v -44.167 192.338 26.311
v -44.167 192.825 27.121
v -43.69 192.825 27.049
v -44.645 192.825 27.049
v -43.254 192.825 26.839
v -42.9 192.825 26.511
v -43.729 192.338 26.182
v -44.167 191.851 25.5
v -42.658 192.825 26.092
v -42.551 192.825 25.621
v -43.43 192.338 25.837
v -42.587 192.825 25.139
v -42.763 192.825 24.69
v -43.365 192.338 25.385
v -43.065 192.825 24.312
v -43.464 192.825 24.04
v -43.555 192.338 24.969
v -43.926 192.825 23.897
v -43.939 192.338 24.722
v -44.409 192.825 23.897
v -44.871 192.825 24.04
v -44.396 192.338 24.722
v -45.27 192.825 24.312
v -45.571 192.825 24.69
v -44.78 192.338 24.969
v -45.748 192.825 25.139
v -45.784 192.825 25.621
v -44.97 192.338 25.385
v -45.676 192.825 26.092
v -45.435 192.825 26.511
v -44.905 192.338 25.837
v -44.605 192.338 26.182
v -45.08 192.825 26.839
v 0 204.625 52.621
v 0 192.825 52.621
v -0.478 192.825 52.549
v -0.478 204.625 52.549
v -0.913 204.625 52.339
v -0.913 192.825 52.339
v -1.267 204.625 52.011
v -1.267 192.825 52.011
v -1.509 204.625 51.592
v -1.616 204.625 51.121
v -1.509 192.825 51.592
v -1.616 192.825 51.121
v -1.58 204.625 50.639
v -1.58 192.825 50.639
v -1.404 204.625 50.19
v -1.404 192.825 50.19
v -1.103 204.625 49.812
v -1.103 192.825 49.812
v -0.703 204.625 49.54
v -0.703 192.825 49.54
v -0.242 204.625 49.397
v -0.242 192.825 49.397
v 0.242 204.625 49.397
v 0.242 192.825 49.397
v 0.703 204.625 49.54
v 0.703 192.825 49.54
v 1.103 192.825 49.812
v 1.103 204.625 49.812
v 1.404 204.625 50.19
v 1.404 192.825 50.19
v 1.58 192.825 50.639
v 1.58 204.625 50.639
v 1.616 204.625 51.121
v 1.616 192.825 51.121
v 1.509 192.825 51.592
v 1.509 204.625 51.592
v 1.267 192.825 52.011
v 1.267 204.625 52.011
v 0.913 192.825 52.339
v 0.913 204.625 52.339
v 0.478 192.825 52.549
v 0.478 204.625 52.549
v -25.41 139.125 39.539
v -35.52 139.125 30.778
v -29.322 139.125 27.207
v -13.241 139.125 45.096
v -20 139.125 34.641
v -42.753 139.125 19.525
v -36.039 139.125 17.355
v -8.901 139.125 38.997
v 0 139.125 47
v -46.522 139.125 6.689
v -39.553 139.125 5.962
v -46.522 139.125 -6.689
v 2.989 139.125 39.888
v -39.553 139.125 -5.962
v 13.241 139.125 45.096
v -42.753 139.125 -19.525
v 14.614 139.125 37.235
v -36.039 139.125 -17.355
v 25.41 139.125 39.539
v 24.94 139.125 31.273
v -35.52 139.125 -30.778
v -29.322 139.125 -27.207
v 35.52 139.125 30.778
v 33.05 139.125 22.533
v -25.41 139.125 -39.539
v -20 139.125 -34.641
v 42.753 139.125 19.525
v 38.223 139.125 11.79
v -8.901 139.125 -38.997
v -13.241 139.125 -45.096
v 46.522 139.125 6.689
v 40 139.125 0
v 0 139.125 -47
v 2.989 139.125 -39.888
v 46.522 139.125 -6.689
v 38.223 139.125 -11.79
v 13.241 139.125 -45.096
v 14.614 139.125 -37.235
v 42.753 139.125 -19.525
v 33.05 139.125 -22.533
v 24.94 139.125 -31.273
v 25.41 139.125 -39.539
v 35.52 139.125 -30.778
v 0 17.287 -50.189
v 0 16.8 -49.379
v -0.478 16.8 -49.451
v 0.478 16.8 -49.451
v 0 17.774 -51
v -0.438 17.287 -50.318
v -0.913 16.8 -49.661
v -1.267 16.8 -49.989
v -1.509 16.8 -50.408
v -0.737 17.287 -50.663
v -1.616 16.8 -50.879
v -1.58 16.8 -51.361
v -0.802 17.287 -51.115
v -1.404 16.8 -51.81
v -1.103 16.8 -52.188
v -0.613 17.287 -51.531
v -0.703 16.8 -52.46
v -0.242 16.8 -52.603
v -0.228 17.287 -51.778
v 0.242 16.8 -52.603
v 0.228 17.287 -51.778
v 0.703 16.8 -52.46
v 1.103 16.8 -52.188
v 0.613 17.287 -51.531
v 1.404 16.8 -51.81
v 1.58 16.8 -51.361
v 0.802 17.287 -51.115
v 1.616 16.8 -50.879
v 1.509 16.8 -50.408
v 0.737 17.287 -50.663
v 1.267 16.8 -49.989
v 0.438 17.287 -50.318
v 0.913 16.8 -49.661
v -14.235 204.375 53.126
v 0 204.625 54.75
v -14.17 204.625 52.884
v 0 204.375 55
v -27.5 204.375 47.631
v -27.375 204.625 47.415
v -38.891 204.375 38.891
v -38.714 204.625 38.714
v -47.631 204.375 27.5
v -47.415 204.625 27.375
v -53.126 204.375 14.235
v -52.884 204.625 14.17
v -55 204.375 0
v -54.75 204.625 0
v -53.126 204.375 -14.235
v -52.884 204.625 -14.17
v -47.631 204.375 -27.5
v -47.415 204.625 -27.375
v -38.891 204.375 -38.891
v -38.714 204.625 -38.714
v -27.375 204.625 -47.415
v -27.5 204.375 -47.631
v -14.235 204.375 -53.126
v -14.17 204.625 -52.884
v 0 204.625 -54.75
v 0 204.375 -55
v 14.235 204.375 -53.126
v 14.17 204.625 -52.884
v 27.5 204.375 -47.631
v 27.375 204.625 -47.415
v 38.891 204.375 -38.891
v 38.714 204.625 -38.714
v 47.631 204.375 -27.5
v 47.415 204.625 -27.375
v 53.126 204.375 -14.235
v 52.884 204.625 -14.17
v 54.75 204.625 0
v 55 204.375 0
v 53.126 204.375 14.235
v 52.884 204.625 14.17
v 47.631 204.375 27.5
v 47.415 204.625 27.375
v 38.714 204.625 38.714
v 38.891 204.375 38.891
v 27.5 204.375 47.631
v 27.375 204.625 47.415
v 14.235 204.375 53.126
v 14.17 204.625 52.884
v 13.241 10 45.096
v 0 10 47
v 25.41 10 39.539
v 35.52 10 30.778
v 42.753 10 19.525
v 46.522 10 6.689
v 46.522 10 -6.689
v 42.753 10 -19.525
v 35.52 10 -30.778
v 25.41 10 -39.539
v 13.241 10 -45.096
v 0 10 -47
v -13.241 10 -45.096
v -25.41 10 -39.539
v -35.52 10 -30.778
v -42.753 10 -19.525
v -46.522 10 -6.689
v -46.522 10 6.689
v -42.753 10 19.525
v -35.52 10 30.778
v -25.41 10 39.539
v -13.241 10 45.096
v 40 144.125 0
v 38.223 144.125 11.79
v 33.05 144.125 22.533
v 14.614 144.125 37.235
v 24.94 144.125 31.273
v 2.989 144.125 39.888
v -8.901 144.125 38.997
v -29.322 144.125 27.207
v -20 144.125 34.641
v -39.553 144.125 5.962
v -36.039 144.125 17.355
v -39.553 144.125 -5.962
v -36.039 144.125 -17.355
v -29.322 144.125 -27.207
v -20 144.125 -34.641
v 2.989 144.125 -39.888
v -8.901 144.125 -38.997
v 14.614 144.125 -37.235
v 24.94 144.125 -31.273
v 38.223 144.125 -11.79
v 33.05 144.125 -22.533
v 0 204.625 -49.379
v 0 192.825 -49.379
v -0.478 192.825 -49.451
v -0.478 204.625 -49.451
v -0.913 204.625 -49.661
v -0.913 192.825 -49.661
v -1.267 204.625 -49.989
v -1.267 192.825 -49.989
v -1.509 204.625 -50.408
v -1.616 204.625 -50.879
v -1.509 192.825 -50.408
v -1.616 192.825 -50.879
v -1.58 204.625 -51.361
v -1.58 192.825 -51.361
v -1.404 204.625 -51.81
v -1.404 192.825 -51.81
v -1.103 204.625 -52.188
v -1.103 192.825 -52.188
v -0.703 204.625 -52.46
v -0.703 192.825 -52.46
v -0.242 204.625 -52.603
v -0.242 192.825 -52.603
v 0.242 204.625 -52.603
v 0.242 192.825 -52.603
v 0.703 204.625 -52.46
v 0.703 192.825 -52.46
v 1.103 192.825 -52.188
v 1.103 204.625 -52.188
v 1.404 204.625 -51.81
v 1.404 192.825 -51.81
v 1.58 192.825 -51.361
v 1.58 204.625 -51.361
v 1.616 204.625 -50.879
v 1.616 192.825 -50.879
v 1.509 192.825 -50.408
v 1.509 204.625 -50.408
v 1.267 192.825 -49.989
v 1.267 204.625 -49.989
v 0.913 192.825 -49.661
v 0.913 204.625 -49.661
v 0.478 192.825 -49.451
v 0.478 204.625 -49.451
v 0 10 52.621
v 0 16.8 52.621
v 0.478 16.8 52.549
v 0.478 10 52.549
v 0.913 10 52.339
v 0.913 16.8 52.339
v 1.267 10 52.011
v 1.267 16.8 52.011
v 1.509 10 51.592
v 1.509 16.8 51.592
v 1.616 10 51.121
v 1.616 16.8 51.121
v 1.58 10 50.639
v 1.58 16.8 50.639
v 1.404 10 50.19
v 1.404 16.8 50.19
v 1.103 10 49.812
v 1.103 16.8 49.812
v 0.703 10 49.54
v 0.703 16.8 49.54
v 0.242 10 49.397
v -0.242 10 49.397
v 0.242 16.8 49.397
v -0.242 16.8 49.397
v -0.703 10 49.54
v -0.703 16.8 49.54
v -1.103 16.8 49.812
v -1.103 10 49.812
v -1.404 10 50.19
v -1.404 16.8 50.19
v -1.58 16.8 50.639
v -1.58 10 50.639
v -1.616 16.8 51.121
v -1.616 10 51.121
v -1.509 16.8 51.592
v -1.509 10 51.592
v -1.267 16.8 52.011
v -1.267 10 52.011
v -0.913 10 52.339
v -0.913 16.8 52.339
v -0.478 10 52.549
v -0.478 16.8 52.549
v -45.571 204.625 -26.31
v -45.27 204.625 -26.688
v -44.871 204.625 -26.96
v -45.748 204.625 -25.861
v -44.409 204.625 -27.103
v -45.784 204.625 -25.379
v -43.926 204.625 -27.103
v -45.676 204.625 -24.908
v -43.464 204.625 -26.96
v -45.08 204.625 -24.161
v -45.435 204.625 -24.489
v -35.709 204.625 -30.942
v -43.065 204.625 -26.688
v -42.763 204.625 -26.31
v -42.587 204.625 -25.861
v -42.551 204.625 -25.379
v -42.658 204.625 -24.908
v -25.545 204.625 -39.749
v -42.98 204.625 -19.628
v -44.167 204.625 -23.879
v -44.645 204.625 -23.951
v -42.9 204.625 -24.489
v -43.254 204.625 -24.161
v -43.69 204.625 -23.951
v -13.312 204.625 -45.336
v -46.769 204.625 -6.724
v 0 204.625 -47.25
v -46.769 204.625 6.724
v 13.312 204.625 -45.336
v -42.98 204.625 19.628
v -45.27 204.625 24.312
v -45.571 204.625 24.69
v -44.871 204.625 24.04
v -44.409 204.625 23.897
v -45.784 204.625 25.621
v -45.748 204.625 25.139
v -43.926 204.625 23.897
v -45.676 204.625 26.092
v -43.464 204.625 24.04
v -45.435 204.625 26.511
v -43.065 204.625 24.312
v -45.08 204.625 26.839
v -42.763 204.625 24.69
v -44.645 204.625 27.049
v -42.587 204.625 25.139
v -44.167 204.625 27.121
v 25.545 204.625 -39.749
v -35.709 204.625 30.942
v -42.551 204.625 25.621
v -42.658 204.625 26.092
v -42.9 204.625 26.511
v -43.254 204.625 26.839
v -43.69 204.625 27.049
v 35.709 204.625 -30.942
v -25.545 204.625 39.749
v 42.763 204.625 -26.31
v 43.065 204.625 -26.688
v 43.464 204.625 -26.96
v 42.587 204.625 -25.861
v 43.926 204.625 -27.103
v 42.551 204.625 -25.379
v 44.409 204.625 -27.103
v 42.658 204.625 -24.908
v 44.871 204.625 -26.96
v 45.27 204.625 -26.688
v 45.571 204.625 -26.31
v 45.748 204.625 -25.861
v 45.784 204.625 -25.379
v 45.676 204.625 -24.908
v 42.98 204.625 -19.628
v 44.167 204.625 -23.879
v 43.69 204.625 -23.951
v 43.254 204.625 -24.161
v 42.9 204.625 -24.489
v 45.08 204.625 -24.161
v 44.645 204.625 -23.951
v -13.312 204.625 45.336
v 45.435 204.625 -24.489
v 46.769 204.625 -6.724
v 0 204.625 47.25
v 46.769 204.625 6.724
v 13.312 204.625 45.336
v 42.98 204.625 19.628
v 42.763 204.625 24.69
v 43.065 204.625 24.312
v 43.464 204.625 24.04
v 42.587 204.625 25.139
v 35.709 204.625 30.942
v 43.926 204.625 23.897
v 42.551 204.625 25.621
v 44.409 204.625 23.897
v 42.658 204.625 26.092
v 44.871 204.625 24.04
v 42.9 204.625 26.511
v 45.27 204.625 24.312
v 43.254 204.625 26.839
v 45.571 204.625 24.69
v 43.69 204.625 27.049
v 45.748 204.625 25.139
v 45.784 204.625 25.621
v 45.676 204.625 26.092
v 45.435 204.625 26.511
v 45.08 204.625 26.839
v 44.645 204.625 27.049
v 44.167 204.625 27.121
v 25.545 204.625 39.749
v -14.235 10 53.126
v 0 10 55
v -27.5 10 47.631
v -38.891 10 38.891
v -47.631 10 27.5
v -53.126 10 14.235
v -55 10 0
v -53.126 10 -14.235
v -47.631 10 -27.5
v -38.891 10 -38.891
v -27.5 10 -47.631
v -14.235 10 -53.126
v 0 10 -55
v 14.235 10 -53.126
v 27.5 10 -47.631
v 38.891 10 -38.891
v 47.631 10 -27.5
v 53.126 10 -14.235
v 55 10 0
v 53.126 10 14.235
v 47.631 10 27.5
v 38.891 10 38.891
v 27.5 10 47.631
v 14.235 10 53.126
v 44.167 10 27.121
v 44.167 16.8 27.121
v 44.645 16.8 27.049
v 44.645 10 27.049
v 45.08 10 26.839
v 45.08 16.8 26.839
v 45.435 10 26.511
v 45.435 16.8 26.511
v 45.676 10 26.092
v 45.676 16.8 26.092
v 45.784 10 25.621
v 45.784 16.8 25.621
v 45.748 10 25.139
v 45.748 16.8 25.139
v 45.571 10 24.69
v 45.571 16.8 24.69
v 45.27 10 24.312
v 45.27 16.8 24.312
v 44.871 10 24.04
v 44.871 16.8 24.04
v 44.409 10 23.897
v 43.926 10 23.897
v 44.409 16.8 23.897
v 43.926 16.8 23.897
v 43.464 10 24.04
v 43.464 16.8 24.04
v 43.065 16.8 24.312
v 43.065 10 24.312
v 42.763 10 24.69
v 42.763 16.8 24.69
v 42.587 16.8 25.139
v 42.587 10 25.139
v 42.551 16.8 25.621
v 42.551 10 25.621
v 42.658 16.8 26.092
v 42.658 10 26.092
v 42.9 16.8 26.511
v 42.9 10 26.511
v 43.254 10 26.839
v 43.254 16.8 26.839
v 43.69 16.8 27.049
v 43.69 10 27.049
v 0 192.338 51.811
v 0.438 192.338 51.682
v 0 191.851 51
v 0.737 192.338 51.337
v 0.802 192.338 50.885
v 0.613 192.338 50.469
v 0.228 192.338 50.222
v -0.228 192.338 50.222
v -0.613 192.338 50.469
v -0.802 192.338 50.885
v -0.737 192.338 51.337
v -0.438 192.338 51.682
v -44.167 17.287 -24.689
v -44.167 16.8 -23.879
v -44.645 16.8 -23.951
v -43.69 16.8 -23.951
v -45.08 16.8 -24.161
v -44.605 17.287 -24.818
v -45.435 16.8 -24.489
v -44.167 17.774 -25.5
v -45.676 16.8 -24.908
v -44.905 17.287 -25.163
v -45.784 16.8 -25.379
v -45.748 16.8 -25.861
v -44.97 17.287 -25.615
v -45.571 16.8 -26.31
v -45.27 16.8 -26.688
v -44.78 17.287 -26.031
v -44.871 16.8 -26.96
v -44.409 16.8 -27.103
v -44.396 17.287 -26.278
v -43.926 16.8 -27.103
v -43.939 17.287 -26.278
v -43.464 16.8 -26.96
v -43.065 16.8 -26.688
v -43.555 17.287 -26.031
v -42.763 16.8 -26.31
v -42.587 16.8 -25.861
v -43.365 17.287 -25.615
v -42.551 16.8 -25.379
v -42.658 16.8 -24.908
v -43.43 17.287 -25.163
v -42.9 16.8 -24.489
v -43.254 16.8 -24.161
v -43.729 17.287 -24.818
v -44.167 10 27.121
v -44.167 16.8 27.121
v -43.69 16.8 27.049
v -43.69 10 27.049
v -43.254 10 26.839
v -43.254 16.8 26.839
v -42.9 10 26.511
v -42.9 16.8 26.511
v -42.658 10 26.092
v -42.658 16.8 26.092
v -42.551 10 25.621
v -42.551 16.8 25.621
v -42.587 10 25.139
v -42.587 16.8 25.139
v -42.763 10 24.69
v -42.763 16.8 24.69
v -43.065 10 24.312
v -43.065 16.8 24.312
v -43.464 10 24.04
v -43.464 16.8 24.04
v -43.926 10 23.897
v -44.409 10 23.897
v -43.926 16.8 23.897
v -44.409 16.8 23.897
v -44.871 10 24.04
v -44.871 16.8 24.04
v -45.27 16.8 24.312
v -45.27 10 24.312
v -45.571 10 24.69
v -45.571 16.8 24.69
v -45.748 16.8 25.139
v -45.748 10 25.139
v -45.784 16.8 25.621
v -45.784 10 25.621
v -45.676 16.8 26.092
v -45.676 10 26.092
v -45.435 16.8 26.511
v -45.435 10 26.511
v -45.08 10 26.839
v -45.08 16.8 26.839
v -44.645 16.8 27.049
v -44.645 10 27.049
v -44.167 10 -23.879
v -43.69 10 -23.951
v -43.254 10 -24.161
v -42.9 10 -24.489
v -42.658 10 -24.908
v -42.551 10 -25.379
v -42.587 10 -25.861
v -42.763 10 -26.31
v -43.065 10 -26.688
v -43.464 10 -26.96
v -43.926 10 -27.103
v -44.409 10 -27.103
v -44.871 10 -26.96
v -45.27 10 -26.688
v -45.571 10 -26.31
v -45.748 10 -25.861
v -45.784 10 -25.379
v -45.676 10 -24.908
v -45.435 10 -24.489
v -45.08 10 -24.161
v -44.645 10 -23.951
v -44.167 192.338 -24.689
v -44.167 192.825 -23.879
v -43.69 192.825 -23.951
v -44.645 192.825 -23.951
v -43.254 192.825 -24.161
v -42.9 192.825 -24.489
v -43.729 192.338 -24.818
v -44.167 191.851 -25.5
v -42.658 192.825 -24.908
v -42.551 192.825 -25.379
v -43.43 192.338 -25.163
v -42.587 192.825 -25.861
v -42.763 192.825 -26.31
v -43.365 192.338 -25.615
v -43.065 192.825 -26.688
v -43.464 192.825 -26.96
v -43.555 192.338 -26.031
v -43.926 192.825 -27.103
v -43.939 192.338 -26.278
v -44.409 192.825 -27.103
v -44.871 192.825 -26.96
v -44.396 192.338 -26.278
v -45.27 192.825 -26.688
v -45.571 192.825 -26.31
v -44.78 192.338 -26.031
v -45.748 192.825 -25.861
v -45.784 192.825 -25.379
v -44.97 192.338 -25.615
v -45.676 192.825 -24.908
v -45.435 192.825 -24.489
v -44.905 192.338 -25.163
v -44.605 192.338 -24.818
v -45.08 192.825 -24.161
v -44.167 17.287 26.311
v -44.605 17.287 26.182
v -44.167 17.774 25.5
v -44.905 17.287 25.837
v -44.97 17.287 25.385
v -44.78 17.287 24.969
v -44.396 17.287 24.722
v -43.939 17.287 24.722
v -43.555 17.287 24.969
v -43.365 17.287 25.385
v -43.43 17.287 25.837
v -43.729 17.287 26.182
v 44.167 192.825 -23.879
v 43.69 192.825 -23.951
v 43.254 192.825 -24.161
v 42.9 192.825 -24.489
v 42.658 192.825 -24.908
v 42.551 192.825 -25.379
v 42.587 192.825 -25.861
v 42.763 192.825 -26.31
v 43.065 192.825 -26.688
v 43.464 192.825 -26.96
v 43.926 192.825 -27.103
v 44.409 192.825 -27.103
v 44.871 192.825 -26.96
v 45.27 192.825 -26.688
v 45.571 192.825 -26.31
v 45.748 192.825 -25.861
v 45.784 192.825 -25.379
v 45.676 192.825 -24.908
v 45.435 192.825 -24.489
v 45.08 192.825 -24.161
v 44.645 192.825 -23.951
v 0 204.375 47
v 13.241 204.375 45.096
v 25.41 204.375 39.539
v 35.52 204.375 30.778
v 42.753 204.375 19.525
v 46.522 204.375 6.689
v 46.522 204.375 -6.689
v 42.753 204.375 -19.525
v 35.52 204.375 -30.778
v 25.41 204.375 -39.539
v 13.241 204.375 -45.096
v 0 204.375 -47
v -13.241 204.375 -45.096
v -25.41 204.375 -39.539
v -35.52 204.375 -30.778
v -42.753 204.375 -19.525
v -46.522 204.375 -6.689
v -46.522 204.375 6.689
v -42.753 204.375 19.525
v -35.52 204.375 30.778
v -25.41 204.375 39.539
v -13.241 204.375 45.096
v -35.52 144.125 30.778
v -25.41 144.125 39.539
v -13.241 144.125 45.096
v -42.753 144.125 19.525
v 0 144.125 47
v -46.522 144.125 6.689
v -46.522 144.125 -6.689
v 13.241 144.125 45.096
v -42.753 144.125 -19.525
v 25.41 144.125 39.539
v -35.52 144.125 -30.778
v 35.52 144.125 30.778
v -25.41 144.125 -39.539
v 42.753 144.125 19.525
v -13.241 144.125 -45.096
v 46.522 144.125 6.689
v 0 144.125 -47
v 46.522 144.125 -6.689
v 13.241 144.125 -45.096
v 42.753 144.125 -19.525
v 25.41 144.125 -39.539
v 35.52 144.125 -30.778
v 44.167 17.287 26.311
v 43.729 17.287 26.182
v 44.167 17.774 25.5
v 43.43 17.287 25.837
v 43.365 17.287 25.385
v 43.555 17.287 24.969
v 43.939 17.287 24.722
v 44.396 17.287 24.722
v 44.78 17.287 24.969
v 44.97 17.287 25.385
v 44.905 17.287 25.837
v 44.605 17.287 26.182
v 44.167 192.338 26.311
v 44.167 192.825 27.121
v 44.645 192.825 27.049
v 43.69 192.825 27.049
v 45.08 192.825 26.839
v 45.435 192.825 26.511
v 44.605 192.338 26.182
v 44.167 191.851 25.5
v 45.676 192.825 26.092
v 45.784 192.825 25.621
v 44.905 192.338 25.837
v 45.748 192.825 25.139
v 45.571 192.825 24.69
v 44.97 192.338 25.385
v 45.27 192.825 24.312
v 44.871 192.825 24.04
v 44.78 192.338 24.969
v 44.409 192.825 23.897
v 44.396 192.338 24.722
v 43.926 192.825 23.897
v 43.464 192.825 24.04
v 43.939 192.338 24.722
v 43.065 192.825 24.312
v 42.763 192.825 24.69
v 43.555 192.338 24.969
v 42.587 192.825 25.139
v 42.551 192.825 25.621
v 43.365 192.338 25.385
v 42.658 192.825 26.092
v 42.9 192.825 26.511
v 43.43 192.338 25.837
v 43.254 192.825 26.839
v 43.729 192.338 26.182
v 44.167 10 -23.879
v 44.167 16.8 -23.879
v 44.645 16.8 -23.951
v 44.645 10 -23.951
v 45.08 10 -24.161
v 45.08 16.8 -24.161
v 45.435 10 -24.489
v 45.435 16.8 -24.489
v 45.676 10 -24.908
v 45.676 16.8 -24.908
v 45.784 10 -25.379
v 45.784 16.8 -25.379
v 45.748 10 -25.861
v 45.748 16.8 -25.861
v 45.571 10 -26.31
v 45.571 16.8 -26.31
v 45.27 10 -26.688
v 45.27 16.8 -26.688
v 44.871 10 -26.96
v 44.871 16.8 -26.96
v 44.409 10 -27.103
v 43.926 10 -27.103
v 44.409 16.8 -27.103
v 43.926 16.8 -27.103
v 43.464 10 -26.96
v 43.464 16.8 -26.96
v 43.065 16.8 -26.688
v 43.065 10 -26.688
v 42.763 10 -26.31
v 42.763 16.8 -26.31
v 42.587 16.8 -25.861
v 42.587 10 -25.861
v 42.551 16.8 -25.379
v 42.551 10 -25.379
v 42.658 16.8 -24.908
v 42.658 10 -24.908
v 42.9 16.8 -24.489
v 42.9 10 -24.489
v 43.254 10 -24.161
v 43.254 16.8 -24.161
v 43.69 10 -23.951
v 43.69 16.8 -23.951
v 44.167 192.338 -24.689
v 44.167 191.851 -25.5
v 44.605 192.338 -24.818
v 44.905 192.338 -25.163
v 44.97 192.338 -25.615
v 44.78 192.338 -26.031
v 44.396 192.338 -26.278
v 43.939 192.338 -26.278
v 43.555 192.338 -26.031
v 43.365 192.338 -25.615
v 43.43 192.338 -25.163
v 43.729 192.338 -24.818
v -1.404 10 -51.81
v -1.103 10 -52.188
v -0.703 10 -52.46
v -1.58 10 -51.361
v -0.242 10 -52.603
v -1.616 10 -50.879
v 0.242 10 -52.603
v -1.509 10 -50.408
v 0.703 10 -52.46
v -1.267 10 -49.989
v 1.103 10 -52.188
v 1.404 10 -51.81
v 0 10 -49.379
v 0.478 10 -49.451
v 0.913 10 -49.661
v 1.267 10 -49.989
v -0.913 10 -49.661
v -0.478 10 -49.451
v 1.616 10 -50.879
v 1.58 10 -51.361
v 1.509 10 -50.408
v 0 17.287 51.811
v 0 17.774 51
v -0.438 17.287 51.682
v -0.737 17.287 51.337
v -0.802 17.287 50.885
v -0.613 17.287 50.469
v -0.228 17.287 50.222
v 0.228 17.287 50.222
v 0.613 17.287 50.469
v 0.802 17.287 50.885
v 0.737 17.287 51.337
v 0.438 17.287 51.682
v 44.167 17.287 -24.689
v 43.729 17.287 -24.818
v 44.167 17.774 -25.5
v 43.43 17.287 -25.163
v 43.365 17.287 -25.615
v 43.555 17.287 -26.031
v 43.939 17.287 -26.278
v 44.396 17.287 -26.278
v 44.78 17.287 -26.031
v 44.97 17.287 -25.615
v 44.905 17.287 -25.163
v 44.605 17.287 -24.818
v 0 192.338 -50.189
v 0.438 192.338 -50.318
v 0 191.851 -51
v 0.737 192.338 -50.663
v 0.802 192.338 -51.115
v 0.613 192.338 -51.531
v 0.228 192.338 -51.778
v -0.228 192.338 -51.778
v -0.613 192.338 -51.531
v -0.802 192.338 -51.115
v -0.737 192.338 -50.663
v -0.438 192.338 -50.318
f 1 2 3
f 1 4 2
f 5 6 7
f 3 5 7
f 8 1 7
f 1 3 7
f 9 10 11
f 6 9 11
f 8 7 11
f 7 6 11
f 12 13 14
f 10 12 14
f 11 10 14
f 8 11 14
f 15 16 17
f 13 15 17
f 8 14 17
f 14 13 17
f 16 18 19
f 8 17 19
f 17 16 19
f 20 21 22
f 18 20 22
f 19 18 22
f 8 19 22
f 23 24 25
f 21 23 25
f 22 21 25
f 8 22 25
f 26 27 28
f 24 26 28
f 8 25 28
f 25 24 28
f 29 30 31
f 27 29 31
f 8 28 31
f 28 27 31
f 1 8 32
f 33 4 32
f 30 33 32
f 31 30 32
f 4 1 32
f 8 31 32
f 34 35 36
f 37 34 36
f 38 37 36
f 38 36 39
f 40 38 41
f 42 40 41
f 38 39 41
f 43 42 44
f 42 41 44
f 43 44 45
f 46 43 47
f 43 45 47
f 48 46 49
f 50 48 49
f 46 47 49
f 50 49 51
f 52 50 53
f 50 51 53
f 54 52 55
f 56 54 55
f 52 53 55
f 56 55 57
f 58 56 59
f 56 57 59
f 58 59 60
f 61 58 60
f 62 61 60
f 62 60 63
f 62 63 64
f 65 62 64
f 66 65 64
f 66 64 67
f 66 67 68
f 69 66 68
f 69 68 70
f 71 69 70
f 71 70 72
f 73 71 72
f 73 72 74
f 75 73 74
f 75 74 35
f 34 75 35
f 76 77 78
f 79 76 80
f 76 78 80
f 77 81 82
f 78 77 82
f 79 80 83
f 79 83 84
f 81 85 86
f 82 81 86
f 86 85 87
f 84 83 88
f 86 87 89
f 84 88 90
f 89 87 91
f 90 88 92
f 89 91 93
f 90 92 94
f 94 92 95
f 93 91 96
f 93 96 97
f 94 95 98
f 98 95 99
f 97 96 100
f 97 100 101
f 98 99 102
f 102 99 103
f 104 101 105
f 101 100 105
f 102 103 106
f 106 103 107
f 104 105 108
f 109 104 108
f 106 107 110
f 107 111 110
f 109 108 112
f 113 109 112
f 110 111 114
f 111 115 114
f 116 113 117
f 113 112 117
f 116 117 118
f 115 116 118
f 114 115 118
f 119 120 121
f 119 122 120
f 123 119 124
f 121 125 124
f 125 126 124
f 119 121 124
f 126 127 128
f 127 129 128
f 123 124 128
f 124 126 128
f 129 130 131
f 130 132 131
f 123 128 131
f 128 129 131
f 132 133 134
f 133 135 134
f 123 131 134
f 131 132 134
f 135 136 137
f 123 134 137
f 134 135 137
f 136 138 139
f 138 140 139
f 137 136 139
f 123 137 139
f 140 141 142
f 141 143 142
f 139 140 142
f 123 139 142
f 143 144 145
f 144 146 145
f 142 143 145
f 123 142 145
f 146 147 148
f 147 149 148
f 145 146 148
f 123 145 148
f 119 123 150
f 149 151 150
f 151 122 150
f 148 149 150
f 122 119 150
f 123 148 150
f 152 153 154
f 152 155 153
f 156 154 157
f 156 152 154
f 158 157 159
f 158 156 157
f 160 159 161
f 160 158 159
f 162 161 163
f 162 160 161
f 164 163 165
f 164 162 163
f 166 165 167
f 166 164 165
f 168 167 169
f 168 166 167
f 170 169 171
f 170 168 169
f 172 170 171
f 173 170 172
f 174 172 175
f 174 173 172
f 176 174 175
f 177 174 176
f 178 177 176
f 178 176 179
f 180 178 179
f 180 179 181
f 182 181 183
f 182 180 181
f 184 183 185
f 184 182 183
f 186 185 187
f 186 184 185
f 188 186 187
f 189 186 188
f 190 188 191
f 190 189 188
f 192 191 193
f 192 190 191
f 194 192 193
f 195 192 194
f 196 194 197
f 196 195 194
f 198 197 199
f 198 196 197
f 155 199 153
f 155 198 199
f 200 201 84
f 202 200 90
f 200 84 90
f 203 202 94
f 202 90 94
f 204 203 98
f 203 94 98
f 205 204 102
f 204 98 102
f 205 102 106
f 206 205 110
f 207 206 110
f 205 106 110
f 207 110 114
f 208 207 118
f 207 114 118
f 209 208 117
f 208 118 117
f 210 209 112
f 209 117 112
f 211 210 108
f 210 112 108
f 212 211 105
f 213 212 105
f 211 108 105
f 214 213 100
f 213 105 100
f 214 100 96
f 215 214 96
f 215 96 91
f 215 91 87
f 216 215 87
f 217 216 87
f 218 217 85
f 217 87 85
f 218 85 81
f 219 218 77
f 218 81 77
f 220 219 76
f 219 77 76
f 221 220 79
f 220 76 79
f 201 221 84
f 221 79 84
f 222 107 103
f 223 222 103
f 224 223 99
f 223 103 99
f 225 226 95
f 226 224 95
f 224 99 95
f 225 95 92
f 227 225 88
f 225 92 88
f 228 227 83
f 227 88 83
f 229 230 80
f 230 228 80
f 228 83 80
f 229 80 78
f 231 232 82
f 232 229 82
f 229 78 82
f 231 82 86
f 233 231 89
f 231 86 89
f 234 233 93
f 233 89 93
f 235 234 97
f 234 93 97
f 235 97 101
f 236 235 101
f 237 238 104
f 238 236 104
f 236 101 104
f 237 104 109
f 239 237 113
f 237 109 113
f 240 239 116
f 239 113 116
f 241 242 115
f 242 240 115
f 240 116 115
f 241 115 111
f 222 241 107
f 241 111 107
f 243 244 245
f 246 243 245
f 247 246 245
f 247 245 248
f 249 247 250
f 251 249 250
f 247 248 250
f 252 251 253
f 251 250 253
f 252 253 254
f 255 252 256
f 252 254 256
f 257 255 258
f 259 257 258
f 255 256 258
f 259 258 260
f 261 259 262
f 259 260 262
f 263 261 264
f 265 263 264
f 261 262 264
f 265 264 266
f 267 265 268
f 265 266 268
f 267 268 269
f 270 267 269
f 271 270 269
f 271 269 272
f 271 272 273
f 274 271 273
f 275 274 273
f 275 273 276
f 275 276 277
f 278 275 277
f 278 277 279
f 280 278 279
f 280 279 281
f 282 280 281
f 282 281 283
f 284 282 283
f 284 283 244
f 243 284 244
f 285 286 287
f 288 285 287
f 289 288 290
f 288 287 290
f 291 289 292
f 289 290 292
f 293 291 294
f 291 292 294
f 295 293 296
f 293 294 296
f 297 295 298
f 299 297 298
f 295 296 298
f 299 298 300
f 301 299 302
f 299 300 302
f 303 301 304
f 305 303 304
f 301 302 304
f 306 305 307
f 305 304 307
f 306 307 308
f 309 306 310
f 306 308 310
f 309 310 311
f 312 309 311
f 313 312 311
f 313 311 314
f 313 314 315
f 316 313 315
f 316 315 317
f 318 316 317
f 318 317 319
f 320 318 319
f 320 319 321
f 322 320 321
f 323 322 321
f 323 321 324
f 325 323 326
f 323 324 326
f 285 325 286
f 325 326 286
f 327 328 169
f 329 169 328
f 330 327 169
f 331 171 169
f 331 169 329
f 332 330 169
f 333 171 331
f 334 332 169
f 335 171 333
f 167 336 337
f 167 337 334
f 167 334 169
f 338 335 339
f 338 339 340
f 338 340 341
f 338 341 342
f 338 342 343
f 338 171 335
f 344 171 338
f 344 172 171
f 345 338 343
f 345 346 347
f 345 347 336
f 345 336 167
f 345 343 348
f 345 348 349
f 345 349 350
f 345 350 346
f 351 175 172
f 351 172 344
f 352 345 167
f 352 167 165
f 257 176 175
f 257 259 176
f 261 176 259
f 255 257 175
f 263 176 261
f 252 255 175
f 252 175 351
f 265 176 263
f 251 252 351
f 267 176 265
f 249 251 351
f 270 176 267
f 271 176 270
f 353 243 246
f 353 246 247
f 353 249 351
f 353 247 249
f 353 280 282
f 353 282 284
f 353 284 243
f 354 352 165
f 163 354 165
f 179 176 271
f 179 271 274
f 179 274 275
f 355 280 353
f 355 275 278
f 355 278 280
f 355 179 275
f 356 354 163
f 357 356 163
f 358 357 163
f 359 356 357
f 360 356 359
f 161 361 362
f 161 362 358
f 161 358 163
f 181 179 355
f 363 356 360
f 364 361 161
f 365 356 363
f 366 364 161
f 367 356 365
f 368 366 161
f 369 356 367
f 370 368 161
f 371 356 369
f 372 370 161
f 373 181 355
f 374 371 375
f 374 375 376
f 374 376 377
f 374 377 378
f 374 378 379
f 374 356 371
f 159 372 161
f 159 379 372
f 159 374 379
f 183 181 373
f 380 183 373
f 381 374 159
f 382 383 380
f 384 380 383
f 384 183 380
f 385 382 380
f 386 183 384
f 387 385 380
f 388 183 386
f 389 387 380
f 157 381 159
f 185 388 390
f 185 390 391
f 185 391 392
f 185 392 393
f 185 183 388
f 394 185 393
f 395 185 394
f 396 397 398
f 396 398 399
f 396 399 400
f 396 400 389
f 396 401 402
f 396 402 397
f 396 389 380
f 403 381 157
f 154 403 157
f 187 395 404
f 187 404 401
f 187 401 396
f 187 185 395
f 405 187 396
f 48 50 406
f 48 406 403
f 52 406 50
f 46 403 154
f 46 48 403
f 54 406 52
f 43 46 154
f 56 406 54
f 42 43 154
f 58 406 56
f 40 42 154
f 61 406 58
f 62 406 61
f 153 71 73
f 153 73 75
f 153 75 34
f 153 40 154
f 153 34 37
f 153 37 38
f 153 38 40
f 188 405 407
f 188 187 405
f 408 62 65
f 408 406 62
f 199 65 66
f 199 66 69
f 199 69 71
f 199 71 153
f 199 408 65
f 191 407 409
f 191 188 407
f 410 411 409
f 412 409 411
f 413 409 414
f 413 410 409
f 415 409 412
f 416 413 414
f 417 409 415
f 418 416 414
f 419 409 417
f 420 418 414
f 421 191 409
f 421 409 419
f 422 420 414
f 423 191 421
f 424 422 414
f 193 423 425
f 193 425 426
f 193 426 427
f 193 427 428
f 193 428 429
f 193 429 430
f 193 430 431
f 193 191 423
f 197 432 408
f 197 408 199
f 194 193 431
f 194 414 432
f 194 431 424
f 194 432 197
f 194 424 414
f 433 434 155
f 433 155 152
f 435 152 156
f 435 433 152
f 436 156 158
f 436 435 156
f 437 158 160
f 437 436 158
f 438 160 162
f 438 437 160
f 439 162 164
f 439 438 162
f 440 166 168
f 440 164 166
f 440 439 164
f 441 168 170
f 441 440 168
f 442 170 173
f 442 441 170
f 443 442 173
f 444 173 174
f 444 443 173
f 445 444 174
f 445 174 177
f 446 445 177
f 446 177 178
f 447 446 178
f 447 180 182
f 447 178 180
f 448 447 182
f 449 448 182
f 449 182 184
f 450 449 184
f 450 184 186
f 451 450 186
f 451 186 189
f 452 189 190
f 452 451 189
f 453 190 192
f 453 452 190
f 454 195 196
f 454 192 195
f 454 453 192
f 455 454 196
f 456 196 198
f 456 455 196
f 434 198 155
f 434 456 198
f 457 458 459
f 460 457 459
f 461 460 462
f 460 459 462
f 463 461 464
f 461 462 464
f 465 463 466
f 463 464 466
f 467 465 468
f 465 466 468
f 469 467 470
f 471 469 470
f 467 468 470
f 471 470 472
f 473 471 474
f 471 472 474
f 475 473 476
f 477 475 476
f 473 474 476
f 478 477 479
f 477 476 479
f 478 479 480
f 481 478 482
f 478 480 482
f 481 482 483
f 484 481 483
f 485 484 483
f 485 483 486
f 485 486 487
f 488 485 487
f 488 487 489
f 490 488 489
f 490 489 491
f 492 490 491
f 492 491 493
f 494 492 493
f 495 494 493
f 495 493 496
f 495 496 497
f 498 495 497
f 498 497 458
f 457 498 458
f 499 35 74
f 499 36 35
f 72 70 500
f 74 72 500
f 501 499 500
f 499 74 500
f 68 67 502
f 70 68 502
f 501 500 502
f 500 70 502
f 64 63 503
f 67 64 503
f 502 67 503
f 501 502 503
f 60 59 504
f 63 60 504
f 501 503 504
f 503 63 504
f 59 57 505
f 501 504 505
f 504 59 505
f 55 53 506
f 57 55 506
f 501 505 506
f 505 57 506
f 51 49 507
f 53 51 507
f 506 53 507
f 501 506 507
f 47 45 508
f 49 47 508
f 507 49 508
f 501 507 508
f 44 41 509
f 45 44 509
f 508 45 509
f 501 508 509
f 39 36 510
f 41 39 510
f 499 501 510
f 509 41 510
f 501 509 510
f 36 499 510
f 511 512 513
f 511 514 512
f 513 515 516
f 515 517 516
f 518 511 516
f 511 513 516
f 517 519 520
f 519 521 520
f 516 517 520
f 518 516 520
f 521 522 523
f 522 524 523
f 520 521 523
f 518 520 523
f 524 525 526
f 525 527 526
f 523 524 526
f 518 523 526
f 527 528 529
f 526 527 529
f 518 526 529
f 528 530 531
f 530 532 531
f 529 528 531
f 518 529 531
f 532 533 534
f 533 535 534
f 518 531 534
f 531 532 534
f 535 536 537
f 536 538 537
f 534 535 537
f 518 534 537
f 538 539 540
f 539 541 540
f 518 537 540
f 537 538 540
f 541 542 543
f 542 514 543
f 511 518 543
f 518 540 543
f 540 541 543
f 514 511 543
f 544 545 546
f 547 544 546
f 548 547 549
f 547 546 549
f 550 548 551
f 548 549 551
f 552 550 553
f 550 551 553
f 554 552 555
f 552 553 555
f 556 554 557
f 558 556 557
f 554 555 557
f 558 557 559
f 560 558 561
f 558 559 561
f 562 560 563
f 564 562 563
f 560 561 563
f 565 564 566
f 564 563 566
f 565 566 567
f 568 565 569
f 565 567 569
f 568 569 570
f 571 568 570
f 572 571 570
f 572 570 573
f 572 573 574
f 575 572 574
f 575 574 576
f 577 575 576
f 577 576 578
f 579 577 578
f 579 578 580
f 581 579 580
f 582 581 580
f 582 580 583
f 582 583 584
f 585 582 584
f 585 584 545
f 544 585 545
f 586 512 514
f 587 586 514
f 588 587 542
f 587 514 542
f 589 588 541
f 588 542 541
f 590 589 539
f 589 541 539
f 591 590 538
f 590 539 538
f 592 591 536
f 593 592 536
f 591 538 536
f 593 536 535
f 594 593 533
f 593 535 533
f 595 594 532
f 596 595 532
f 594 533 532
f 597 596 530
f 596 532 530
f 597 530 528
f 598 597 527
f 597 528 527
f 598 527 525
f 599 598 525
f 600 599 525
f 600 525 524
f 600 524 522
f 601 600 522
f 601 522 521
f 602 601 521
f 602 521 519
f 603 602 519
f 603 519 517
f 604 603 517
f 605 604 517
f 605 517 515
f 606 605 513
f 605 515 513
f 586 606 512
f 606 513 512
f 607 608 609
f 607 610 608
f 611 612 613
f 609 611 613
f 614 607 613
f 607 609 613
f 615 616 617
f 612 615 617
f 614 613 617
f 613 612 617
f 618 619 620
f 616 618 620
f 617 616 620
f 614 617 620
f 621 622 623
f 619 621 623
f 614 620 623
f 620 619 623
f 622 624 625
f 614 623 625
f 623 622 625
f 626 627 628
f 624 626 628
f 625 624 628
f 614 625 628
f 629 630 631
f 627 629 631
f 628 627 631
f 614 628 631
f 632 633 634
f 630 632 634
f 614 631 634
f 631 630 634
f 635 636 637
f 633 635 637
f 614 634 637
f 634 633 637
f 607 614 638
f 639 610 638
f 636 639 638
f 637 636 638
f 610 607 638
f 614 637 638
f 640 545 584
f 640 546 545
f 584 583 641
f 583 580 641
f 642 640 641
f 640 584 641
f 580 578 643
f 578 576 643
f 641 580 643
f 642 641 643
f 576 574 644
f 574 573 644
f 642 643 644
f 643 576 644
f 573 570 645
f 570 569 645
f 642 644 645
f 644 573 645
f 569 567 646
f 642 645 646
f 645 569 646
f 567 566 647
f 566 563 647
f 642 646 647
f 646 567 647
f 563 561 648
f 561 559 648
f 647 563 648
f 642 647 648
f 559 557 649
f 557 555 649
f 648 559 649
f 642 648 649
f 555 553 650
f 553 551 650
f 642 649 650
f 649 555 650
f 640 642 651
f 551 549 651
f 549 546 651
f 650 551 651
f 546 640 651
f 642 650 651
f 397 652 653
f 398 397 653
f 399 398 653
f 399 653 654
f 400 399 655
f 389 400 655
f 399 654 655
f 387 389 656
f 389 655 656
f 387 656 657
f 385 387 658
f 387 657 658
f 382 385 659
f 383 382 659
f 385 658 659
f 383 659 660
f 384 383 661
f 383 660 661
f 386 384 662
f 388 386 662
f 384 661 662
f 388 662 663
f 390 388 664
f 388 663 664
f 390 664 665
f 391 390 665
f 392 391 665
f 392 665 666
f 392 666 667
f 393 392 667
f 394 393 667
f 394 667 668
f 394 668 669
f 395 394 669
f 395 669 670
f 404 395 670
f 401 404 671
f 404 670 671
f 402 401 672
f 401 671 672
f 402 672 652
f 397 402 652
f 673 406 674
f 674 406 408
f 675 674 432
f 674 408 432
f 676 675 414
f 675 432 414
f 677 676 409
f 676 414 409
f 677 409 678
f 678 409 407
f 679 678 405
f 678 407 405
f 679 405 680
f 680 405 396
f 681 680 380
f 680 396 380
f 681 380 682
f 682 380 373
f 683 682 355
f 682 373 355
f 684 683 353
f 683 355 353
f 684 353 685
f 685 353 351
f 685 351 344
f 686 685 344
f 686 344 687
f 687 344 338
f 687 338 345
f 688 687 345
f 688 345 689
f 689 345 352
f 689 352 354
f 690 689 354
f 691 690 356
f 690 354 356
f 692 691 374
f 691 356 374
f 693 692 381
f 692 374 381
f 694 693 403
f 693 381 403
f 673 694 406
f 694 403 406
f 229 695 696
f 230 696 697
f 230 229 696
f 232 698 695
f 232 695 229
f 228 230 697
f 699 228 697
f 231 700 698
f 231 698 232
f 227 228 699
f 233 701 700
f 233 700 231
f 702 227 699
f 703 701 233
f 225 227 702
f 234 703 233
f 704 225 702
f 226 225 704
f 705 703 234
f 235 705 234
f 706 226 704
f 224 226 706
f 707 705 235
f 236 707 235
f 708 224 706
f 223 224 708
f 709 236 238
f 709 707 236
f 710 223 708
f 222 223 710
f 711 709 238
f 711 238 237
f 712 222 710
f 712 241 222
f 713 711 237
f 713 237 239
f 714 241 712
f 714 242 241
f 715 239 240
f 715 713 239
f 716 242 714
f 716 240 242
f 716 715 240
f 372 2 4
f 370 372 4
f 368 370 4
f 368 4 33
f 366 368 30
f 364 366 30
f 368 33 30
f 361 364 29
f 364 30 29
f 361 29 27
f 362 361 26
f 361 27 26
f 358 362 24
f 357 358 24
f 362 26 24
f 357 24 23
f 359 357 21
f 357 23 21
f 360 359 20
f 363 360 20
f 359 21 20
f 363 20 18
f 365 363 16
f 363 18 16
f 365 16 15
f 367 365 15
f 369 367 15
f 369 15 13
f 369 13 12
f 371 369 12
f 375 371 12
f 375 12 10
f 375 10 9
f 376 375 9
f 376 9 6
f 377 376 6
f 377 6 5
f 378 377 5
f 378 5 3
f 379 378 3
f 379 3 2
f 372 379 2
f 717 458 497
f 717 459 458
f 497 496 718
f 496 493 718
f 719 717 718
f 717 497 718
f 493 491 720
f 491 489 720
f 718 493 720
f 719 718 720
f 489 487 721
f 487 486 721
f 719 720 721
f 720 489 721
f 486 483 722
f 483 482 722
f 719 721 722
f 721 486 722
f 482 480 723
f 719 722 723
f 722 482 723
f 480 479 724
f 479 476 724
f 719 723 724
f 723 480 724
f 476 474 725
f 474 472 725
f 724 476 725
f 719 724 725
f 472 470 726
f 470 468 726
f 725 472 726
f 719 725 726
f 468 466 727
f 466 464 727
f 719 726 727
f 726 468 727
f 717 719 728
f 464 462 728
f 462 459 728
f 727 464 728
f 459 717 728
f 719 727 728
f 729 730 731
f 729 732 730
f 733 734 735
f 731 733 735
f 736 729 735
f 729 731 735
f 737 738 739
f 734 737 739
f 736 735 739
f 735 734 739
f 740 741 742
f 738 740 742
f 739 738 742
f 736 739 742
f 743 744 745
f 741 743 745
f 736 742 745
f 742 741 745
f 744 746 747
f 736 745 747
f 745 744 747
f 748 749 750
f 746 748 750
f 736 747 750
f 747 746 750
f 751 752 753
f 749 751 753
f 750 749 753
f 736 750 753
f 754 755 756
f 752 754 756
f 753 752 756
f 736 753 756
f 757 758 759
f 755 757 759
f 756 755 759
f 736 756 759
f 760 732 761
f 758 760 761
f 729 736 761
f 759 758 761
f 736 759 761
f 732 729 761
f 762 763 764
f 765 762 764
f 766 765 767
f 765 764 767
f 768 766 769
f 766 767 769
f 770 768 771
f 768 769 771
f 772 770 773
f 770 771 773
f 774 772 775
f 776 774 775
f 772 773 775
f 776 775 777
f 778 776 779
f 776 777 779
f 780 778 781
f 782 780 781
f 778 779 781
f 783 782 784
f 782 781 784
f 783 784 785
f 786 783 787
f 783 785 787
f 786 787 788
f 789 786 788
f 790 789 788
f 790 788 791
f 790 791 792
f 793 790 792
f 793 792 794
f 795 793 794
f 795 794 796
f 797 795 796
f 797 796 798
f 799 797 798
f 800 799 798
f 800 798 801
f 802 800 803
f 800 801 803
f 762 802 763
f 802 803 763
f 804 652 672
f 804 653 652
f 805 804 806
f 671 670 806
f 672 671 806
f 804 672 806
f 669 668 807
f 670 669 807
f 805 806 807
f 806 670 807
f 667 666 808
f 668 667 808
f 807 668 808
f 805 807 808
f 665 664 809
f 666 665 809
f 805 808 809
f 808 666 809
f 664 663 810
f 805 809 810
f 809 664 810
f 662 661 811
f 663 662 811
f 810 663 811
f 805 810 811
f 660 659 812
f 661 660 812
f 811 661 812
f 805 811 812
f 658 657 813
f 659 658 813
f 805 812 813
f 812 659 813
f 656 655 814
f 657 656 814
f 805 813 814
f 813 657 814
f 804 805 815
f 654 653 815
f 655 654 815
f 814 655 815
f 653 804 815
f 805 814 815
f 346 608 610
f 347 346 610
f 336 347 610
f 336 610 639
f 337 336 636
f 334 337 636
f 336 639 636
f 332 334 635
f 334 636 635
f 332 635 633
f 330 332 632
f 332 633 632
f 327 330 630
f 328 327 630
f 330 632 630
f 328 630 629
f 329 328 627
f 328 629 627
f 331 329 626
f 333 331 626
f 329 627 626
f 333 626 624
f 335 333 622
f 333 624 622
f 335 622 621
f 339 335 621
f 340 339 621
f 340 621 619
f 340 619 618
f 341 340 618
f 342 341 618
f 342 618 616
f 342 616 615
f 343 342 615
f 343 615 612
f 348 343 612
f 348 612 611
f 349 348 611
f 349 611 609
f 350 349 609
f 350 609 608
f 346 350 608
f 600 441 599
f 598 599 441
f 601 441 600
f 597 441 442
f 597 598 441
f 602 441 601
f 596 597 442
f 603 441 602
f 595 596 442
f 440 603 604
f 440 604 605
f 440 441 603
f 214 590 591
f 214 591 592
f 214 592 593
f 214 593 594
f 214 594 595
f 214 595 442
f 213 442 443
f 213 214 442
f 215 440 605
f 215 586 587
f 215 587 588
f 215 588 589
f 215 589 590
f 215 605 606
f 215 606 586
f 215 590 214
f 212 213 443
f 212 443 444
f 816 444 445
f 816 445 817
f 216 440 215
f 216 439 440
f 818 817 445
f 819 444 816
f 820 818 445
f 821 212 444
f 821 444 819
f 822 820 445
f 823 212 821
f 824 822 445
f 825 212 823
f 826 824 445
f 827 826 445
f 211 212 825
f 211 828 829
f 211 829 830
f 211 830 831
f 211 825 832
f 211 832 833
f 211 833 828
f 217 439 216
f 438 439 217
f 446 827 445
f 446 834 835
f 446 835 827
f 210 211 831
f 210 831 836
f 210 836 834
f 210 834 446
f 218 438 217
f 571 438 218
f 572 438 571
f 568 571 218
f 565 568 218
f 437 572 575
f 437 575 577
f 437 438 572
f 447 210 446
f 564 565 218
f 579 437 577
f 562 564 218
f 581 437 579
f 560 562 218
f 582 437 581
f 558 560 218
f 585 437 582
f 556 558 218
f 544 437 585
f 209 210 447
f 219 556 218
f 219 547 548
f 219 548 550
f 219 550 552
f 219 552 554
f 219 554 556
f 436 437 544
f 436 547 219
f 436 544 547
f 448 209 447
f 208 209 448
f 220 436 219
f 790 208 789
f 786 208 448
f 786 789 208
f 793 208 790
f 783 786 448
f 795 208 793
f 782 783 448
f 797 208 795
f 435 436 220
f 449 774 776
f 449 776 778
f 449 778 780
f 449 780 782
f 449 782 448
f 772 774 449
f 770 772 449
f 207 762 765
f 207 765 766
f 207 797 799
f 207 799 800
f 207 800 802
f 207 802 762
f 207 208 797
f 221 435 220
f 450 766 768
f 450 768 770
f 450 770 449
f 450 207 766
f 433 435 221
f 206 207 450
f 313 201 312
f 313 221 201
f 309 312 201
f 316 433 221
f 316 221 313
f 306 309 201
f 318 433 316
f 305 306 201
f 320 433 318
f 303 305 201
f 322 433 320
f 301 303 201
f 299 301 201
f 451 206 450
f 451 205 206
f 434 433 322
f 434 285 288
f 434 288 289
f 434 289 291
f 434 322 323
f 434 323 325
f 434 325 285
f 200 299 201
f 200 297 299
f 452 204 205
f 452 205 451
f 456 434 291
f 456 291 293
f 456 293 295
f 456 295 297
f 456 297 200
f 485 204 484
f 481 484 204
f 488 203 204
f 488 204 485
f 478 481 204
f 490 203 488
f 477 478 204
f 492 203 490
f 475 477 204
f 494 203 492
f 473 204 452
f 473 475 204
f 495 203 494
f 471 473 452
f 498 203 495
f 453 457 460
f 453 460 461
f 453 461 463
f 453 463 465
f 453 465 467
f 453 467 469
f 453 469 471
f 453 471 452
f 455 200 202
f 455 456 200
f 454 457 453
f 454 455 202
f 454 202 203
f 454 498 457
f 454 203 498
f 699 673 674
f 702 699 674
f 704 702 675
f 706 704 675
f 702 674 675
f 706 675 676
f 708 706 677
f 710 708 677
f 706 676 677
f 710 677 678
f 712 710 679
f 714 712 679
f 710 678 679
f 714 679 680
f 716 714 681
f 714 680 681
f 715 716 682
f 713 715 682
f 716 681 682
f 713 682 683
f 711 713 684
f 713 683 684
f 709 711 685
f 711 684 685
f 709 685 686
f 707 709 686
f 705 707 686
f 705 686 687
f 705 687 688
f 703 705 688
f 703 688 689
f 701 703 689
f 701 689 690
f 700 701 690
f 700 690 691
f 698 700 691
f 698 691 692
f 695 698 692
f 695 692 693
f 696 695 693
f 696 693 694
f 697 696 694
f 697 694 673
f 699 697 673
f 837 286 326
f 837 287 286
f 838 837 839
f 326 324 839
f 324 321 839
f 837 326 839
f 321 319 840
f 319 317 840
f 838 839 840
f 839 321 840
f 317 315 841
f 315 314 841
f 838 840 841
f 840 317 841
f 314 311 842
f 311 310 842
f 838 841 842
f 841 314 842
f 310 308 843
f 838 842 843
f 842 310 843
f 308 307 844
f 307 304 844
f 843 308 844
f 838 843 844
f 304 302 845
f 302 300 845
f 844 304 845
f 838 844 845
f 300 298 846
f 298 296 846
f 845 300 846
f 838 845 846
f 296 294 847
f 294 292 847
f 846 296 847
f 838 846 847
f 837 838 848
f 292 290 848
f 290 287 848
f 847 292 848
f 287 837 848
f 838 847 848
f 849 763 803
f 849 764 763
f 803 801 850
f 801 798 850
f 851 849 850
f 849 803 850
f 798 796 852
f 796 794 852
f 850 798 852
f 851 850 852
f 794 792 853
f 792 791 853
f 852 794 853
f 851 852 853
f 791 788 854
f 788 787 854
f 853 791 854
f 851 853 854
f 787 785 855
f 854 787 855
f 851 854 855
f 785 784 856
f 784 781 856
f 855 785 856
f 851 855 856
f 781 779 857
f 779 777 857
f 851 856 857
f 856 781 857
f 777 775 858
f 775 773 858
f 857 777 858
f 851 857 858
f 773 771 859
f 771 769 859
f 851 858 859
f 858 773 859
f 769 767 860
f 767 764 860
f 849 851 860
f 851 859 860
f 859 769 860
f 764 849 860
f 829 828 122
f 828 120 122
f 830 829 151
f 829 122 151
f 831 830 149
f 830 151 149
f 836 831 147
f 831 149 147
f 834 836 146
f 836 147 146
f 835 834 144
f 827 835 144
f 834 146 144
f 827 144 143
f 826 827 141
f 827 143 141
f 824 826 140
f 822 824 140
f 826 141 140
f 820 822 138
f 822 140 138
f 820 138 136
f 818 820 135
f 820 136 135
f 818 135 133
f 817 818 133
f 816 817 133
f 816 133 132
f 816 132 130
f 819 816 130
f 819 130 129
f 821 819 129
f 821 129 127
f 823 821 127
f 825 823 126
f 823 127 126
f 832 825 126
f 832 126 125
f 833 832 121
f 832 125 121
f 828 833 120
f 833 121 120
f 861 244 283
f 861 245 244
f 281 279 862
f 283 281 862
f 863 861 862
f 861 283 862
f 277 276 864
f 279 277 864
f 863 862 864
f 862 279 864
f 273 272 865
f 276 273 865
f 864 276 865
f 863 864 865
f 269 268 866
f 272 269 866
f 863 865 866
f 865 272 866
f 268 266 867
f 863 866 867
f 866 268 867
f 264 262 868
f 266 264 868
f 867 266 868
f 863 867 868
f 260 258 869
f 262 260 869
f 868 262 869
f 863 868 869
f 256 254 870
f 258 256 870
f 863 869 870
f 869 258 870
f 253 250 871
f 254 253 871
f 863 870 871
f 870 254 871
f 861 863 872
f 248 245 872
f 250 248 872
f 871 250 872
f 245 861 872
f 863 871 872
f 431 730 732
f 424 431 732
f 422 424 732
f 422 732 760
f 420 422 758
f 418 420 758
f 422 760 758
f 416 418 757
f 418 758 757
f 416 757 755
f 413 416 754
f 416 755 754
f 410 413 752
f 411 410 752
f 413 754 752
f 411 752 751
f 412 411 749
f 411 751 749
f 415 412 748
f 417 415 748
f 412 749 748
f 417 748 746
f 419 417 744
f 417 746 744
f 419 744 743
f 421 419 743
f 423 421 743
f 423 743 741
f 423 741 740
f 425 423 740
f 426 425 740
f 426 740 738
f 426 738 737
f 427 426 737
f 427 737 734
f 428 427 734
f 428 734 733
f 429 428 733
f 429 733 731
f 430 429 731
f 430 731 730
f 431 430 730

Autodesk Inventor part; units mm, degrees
ref_plane "YZ Plane" through (0, 0, 0) normal (1, 0, 0) x (0, 1, 0)
ref_plane "XZ Plane" through (0, 0, 0) normal (0, 1, 0) x (-1, 0, 0)
ref_plane "XY Plane" through (0, 0, 0) normal (0, 0, 1) x (1, 0, 0)
sketch "Skizze1" plane through (0, 0, 0) normal (1, 0, 0) x (0, 1, 0)
  line L0 (204.625, 55) -> (0, 55)
  line L1 (0, 55) -> (0, 47)
  line L2 (0, 47) -> (204.625, 47)
  line L3 (204.625, 47) -> (204.625, 55)
  line L4 (0, 47) -> (8, 47)
  line L5 (8, 47) -> (8, 0)
  line L6 (8, 0) -> (0, 0)
  line L7 (0, 0) -> (0, 47)
  line L8 (-40.925, 0) -> (245.55, 0) projected
  line L9 (0, -11) -> (0, 66) projected
  point P0 (0, 0)
  point P1 (4, 0)
  dimension "d0" = 8
  dimension "d1" = 8
  dimension "d2" = 204.625
  dimension "d3" = 47
  dimension "d4" = 0
  dimension "d5" = 0
revolve "Umdrehung1" add sketch "Skizze1" angle 360 about axis through (0, -10, 0) along (0, 1, 0)
sketch "Skizze2" plane through (0, 204.625, 0) normal (0, 1, 0) x (1, 0, 0)
  circle A0 centre (0, 0) radius 51 construction
  circle A1 centre (0, 0) radius 55 projected
  circle A2 centre (0, 0) radius 51 construction
  circle A3 centre (0, 0) radius 51 construction
  circle A4 centre (0, 0) radius 51 construction
  circle A5 centre (0, 0) radius 51 construction
  circle A6 centre (0, 0) radius 51 construction
  point P0 (0, -51)
  point P1 (44.1673, -25.5)
  point P2 (44.1673, 25.5)
  point P3 (0, 51)
  point P4 (-44.1673, 25.5)
  point P5 (-44.1673, -25.5)
  dimension "d16" = 4
  dimension "d19" = 360
hole "Bohrung1" at (0, 204.625, 51) at (44.1673, 204.625, 25.5) at (44.1673, 204.625, -25.5) at (0, 204.625, -51) at (-44.1673, 204.625, -25.5) at (-44.1673, 204.625, 25.5) direction (0, -1, 0) diameter 3.242 depth 11.8 tip angle 118 thread size "M4x0.7" class "6H" standard "ISO Metric profile"
chamfer "Fase1" distance 0.25 angle 45 1 edges at (0, 204.625, -47)
chamfer "Fase2" distance 0.25 angle 45 1 edges at (0, 204.625, -55)
chamfer "Fase3" distance 0.25 angle 45 1 edges at (0, 0, -55)
sketch "Skizze3" plane through (0, 0, 0) normal (0, -1, 0) x (1, 0, 0)
  circle A0 centre (0, 0) radius 60.1977
extrude "Extrusion1" cut sketch "Skizze3" against normal blind 10
ref_plane "Arbeitsebene1" through (0, 104.8125, 0) normal (0, 1, 0) x (1, 0, 0)
mirror "Spiegeln1" about plane through (0, 104.8125, 0) normal (0, 1, 0) of "Bohrung1"
ref_plane "Arbeitsebene3" through (0, 139.125, 0) normal (0, 1, 0) x (1, 0, 0)
sketch "Skizze4" plane through (0, 139.125, 0) normal (0, 1, 0) x (1, 0, 0)
  circle A0 centre (0, 0) radius 47 projected
  circle A1 centre (0, 0) radius 47 projected
  circle A2 centre (0, 0) radius 47
  circle A3 centre (0, 0) radius 47 projected
  circle A4 centre (0, 0) radius 40
  dimension "d33" = 7
extrude "Extrusion2" add sketch "Skizze4" along normal blind 5
sketch "Skizze5" plane through (0, 204.625, 0) normal (0, 1, 0) x (1, 0, 0)
  point P0 (-44.1673, -25.5)
hole "Bohrung2" at (-44.1673, 204.625, 25.5) direction (0, -1, 0) diameter 3.242 depth 8 tip angle 120 thread size "M4x0.7" class "6H" standard "ISO Metric profile"
properties part number "Gehäuse"
